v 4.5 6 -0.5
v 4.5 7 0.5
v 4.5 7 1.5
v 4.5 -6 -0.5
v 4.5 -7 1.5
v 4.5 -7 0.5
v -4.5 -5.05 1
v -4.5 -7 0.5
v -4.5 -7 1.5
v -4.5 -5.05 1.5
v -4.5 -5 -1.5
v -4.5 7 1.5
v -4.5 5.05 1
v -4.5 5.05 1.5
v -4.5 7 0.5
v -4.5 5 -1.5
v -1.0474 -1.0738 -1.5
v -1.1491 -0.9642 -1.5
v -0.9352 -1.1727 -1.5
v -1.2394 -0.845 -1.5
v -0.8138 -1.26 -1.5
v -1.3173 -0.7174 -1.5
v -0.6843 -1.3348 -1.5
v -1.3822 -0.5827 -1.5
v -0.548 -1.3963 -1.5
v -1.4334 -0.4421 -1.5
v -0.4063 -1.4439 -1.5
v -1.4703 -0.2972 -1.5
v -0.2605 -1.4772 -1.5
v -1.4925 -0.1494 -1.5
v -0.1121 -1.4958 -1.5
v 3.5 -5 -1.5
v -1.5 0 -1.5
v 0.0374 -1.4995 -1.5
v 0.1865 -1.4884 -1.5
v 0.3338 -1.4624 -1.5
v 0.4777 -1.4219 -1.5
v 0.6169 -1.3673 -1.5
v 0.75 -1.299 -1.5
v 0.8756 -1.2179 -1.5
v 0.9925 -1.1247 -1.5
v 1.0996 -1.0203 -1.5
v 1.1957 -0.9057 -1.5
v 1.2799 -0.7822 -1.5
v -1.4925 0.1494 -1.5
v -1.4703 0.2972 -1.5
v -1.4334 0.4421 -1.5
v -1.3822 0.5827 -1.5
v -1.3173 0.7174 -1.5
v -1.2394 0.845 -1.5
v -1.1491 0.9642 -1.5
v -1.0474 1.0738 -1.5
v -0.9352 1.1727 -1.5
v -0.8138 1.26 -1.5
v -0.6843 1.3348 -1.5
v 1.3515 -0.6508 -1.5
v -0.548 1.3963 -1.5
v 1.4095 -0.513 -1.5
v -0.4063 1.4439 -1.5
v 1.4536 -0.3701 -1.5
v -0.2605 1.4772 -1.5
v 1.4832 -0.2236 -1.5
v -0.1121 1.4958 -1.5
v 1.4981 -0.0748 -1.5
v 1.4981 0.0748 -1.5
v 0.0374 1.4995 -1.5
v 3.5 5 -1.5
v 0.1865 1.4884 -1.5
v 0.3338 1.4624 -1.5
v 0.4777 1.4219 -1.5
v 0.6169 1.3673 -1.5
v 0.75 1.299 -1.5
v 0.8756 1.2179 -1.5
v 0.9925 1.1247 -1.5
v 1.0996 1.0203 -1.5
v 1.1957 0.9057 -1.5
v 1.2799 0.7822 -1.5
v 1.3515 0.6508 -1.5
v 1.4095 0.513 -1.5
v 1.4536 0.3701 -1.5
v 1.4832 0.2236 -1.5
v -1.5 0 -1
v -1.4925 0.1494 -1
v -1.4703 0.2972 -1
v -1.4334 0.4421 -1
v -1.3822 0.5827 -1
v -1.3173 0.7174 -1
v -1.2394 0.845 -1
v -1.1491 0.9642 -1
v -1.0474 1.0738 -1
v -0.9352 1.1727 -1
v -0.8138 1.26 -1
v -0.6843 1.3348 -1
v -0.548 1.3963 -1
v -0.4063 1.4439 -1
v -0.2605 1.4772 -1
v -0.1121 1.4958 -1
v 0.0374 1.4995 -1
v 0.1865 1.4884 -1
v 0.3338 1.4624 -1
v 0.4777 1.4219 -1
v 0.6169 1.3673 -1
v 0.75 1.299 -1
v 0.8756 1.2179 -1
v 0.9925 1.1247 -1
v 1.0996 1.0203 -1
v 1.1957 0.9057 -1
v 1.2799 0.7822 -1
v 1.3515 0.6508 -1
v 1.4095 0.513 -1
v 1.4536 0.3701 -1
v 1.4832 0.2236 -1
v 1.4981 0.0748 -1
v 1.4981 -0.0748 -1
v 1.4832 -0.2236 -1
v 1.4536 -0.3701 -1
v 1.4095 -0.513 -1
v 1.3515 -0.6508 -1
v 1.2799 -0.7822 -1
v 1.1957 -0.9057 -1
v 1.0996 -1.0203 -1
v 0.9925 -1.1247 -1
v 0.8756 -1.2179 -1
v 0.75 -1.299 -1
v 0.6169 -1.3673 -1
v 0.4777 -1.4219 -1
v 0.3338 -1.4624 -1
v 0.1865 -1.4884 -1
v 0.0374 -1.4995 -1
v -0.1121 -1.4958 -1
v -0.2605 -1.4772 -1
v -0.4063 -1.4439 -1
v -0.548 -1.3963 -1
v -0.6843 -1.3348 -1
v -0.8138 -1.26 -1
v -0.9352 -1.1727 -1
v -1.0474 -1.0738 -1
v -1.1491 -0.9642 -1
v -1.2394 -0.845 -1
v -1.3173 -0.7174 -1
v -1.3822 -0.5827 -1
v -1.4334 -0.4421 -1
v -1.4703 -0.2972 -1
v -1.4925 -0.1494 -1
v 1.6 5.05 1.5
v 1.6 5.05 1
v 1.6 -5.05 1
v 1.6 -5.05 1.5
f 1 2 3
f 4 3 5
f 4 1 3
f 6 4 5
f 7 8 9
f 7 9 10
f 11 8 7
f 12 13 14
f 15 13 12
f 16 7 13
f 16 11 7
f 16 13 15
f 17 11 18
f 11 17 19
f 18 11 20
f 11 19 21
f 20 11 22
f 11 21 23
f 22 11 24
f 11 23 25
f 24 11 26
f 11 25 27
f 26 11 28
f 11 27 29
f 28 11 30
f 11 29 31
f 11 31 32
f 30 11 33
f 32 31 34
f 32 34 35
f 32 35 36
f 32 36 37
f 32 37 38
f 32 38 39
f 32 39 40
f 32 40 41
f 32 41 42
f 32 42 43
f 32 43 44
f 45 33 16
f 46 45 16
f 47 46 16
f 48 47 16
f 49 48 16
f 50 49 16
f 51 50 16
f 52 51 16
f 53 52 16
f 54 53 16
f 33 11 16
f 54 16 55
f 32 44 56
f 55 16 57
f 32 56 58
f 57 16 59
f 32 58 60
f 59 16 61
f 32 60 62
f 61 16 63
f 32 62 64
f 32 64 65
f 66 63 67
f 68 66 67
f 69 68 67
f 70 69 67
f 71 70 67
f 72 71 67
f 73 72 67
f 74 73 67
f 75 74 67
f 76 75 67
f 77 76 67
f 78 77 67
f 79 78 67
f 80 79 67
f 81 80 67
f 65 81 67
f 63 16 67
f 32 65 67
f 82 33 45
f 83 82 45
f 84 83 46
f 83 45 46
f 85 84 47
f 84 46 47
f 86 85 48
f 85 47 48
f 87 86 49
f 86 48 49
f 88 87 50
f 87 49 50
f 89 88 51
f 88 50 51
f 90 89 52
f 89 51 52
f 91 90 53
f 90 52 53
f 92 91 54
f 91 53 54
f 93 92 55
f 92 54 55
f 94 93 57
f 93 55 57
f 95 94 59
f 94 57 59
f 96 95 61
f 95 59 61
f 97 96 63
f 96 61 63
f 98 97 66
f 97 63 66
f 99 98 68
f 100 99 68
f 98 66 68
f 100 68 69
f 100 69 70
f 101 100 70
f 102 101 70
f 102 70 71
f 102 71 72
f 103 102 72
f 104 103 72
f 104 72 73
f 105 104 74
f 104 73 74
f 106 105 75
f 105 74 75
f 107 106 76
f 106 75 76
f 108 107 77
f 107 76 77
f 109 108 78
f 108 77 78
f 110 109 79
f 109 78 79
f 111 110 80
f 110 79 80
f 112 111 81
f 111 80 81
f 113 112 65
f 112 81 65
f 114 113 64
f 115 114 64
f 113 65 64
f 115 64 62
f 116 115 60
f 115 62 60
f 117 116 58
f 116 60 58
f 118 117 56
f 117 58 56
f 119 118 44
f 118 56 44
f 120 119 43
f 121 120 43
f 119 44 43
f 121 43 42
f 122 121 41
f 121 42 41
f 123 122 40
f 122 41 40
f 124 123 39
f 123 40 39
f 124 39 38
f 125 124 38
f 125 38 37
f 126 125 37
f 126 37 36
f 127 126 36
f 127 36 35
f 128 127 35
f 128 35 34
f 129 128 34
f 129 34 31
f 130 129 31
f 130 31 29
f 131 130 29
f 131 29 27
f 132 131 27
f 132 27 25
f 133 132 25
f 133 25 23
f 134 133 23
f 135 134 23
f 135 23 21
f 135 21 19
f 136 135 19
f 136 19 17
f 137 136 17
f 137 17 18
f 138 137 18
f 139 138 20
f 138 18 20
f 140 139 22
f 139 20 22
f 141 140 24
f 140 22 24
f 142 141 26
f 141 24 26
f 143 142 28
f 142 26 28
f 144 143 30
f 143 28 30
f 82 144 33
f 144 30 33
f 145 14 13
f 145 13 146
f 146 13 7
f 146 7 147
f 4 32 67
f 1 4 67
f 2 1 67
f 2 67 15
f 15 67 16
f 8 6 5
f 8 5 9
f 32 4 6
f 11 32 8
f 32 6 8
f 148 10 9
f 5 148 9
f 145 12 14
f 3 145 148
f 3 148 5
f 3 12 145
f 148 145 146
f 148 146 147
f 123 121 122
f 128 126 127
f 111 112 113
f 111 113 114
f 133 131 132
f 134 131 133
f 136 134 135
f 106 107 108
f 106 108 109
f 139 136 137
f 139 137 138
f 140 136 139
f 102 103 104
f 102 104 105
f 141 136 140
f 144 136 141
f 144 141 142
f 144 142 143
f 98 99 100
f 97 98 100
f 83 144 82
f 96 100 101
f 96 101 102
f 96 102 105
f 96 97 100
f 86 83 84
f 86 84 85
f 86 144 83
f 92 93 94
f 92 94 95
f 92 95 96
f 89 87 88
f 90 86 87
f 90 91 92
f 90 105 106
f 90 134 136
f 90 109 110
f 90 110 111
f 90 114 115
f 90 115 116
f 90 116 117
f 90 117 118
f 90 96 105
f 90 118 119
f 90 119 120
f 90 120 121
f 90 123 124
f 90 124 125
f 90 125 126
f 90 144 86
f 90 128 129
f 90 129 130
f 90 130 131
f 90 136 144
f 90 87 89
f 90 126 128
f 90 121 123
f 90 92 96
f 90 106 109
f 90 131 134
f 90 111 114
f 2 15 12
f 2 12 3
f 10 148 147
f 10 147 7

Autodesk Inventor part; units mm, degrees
ref_plane "YZ Plane" through (0, 0, 0) normal (1, 0, 0) x (0, 1, 0)
ref_plane "XZ Plane" through (0, 0, 0) normal (0, 1, 0) x (-1, 0, 0)
ref_plane "XY Plane" through (0, 0, 0) normal (0, 0, 1) x (1, 0, 0)
sketch "スケッチ1" plane through (0, 0, 0) normal (0, 0, 1) x (1, 0, 0)
  line L0 (-4.5, 7) -> (4.5, 7)
  line L1 (4.5, 7) -> (4.5, -7)
  line L2 (4.5, -7) -> (-4.5, -7)
  line L3 (-4.5, -7) -> (-4.5, 7)
  line L4 (0, -9.8) -> (0, 9.8) projected
  line L5 (-6.3, 0) -> (6.3, 0) projected
  point P0 (0, 0)
  dimension "d0" = 9
  dimension "d1" = 14
extrude "押し出し1" add sketch "スケッチ1" along normal mid plane 3
sketch "スケッチ2" plane through (0, 0, 1.5) normal (0, 0, 1) x (1, 0, 0)
  line L0 (-4.5, 7) -> (-4.5, -7) projected
  line L1 (-4.5, 5.05) -> (1.6, 5.05)
  line L2 (1.6, 5.05) -> (1.6, -5.05)
  line L3 (1.6, -5.05) -> (-4.5, -5.05)
  line L4 (-4.5, -5.05) -> (-4.5, 5.05)
  line L5 (-6.3, 0) -> (6.3, 0) projected
  point P0 (0, 0)
  dimension "d4" = 6.1
  dimension "d5" = 10.1
extrude "押し出し2" cut sketch "スケッチ2" against normal blind 0.5
sketch "スケッチ3" plane through (0, 0, -1.5) normal (0, 0, -1) x (-1, 0, 0)
  circle A0 centre (0, 0) radius 1.5
  dimension "d8" = 3
extrude "押し出し3" cut sketch "スケッチ3" against normal blind 0.5
chamfer "面取り1" distance 2 angle 45 2 edges at (0, -7, -1.5) (0, 7, -1.5)
chamfer "面取り2" distance 1 angle 45 1 edges at (4.5, 0, -1.5)
properties part number "magnet_holder_ver.1"
